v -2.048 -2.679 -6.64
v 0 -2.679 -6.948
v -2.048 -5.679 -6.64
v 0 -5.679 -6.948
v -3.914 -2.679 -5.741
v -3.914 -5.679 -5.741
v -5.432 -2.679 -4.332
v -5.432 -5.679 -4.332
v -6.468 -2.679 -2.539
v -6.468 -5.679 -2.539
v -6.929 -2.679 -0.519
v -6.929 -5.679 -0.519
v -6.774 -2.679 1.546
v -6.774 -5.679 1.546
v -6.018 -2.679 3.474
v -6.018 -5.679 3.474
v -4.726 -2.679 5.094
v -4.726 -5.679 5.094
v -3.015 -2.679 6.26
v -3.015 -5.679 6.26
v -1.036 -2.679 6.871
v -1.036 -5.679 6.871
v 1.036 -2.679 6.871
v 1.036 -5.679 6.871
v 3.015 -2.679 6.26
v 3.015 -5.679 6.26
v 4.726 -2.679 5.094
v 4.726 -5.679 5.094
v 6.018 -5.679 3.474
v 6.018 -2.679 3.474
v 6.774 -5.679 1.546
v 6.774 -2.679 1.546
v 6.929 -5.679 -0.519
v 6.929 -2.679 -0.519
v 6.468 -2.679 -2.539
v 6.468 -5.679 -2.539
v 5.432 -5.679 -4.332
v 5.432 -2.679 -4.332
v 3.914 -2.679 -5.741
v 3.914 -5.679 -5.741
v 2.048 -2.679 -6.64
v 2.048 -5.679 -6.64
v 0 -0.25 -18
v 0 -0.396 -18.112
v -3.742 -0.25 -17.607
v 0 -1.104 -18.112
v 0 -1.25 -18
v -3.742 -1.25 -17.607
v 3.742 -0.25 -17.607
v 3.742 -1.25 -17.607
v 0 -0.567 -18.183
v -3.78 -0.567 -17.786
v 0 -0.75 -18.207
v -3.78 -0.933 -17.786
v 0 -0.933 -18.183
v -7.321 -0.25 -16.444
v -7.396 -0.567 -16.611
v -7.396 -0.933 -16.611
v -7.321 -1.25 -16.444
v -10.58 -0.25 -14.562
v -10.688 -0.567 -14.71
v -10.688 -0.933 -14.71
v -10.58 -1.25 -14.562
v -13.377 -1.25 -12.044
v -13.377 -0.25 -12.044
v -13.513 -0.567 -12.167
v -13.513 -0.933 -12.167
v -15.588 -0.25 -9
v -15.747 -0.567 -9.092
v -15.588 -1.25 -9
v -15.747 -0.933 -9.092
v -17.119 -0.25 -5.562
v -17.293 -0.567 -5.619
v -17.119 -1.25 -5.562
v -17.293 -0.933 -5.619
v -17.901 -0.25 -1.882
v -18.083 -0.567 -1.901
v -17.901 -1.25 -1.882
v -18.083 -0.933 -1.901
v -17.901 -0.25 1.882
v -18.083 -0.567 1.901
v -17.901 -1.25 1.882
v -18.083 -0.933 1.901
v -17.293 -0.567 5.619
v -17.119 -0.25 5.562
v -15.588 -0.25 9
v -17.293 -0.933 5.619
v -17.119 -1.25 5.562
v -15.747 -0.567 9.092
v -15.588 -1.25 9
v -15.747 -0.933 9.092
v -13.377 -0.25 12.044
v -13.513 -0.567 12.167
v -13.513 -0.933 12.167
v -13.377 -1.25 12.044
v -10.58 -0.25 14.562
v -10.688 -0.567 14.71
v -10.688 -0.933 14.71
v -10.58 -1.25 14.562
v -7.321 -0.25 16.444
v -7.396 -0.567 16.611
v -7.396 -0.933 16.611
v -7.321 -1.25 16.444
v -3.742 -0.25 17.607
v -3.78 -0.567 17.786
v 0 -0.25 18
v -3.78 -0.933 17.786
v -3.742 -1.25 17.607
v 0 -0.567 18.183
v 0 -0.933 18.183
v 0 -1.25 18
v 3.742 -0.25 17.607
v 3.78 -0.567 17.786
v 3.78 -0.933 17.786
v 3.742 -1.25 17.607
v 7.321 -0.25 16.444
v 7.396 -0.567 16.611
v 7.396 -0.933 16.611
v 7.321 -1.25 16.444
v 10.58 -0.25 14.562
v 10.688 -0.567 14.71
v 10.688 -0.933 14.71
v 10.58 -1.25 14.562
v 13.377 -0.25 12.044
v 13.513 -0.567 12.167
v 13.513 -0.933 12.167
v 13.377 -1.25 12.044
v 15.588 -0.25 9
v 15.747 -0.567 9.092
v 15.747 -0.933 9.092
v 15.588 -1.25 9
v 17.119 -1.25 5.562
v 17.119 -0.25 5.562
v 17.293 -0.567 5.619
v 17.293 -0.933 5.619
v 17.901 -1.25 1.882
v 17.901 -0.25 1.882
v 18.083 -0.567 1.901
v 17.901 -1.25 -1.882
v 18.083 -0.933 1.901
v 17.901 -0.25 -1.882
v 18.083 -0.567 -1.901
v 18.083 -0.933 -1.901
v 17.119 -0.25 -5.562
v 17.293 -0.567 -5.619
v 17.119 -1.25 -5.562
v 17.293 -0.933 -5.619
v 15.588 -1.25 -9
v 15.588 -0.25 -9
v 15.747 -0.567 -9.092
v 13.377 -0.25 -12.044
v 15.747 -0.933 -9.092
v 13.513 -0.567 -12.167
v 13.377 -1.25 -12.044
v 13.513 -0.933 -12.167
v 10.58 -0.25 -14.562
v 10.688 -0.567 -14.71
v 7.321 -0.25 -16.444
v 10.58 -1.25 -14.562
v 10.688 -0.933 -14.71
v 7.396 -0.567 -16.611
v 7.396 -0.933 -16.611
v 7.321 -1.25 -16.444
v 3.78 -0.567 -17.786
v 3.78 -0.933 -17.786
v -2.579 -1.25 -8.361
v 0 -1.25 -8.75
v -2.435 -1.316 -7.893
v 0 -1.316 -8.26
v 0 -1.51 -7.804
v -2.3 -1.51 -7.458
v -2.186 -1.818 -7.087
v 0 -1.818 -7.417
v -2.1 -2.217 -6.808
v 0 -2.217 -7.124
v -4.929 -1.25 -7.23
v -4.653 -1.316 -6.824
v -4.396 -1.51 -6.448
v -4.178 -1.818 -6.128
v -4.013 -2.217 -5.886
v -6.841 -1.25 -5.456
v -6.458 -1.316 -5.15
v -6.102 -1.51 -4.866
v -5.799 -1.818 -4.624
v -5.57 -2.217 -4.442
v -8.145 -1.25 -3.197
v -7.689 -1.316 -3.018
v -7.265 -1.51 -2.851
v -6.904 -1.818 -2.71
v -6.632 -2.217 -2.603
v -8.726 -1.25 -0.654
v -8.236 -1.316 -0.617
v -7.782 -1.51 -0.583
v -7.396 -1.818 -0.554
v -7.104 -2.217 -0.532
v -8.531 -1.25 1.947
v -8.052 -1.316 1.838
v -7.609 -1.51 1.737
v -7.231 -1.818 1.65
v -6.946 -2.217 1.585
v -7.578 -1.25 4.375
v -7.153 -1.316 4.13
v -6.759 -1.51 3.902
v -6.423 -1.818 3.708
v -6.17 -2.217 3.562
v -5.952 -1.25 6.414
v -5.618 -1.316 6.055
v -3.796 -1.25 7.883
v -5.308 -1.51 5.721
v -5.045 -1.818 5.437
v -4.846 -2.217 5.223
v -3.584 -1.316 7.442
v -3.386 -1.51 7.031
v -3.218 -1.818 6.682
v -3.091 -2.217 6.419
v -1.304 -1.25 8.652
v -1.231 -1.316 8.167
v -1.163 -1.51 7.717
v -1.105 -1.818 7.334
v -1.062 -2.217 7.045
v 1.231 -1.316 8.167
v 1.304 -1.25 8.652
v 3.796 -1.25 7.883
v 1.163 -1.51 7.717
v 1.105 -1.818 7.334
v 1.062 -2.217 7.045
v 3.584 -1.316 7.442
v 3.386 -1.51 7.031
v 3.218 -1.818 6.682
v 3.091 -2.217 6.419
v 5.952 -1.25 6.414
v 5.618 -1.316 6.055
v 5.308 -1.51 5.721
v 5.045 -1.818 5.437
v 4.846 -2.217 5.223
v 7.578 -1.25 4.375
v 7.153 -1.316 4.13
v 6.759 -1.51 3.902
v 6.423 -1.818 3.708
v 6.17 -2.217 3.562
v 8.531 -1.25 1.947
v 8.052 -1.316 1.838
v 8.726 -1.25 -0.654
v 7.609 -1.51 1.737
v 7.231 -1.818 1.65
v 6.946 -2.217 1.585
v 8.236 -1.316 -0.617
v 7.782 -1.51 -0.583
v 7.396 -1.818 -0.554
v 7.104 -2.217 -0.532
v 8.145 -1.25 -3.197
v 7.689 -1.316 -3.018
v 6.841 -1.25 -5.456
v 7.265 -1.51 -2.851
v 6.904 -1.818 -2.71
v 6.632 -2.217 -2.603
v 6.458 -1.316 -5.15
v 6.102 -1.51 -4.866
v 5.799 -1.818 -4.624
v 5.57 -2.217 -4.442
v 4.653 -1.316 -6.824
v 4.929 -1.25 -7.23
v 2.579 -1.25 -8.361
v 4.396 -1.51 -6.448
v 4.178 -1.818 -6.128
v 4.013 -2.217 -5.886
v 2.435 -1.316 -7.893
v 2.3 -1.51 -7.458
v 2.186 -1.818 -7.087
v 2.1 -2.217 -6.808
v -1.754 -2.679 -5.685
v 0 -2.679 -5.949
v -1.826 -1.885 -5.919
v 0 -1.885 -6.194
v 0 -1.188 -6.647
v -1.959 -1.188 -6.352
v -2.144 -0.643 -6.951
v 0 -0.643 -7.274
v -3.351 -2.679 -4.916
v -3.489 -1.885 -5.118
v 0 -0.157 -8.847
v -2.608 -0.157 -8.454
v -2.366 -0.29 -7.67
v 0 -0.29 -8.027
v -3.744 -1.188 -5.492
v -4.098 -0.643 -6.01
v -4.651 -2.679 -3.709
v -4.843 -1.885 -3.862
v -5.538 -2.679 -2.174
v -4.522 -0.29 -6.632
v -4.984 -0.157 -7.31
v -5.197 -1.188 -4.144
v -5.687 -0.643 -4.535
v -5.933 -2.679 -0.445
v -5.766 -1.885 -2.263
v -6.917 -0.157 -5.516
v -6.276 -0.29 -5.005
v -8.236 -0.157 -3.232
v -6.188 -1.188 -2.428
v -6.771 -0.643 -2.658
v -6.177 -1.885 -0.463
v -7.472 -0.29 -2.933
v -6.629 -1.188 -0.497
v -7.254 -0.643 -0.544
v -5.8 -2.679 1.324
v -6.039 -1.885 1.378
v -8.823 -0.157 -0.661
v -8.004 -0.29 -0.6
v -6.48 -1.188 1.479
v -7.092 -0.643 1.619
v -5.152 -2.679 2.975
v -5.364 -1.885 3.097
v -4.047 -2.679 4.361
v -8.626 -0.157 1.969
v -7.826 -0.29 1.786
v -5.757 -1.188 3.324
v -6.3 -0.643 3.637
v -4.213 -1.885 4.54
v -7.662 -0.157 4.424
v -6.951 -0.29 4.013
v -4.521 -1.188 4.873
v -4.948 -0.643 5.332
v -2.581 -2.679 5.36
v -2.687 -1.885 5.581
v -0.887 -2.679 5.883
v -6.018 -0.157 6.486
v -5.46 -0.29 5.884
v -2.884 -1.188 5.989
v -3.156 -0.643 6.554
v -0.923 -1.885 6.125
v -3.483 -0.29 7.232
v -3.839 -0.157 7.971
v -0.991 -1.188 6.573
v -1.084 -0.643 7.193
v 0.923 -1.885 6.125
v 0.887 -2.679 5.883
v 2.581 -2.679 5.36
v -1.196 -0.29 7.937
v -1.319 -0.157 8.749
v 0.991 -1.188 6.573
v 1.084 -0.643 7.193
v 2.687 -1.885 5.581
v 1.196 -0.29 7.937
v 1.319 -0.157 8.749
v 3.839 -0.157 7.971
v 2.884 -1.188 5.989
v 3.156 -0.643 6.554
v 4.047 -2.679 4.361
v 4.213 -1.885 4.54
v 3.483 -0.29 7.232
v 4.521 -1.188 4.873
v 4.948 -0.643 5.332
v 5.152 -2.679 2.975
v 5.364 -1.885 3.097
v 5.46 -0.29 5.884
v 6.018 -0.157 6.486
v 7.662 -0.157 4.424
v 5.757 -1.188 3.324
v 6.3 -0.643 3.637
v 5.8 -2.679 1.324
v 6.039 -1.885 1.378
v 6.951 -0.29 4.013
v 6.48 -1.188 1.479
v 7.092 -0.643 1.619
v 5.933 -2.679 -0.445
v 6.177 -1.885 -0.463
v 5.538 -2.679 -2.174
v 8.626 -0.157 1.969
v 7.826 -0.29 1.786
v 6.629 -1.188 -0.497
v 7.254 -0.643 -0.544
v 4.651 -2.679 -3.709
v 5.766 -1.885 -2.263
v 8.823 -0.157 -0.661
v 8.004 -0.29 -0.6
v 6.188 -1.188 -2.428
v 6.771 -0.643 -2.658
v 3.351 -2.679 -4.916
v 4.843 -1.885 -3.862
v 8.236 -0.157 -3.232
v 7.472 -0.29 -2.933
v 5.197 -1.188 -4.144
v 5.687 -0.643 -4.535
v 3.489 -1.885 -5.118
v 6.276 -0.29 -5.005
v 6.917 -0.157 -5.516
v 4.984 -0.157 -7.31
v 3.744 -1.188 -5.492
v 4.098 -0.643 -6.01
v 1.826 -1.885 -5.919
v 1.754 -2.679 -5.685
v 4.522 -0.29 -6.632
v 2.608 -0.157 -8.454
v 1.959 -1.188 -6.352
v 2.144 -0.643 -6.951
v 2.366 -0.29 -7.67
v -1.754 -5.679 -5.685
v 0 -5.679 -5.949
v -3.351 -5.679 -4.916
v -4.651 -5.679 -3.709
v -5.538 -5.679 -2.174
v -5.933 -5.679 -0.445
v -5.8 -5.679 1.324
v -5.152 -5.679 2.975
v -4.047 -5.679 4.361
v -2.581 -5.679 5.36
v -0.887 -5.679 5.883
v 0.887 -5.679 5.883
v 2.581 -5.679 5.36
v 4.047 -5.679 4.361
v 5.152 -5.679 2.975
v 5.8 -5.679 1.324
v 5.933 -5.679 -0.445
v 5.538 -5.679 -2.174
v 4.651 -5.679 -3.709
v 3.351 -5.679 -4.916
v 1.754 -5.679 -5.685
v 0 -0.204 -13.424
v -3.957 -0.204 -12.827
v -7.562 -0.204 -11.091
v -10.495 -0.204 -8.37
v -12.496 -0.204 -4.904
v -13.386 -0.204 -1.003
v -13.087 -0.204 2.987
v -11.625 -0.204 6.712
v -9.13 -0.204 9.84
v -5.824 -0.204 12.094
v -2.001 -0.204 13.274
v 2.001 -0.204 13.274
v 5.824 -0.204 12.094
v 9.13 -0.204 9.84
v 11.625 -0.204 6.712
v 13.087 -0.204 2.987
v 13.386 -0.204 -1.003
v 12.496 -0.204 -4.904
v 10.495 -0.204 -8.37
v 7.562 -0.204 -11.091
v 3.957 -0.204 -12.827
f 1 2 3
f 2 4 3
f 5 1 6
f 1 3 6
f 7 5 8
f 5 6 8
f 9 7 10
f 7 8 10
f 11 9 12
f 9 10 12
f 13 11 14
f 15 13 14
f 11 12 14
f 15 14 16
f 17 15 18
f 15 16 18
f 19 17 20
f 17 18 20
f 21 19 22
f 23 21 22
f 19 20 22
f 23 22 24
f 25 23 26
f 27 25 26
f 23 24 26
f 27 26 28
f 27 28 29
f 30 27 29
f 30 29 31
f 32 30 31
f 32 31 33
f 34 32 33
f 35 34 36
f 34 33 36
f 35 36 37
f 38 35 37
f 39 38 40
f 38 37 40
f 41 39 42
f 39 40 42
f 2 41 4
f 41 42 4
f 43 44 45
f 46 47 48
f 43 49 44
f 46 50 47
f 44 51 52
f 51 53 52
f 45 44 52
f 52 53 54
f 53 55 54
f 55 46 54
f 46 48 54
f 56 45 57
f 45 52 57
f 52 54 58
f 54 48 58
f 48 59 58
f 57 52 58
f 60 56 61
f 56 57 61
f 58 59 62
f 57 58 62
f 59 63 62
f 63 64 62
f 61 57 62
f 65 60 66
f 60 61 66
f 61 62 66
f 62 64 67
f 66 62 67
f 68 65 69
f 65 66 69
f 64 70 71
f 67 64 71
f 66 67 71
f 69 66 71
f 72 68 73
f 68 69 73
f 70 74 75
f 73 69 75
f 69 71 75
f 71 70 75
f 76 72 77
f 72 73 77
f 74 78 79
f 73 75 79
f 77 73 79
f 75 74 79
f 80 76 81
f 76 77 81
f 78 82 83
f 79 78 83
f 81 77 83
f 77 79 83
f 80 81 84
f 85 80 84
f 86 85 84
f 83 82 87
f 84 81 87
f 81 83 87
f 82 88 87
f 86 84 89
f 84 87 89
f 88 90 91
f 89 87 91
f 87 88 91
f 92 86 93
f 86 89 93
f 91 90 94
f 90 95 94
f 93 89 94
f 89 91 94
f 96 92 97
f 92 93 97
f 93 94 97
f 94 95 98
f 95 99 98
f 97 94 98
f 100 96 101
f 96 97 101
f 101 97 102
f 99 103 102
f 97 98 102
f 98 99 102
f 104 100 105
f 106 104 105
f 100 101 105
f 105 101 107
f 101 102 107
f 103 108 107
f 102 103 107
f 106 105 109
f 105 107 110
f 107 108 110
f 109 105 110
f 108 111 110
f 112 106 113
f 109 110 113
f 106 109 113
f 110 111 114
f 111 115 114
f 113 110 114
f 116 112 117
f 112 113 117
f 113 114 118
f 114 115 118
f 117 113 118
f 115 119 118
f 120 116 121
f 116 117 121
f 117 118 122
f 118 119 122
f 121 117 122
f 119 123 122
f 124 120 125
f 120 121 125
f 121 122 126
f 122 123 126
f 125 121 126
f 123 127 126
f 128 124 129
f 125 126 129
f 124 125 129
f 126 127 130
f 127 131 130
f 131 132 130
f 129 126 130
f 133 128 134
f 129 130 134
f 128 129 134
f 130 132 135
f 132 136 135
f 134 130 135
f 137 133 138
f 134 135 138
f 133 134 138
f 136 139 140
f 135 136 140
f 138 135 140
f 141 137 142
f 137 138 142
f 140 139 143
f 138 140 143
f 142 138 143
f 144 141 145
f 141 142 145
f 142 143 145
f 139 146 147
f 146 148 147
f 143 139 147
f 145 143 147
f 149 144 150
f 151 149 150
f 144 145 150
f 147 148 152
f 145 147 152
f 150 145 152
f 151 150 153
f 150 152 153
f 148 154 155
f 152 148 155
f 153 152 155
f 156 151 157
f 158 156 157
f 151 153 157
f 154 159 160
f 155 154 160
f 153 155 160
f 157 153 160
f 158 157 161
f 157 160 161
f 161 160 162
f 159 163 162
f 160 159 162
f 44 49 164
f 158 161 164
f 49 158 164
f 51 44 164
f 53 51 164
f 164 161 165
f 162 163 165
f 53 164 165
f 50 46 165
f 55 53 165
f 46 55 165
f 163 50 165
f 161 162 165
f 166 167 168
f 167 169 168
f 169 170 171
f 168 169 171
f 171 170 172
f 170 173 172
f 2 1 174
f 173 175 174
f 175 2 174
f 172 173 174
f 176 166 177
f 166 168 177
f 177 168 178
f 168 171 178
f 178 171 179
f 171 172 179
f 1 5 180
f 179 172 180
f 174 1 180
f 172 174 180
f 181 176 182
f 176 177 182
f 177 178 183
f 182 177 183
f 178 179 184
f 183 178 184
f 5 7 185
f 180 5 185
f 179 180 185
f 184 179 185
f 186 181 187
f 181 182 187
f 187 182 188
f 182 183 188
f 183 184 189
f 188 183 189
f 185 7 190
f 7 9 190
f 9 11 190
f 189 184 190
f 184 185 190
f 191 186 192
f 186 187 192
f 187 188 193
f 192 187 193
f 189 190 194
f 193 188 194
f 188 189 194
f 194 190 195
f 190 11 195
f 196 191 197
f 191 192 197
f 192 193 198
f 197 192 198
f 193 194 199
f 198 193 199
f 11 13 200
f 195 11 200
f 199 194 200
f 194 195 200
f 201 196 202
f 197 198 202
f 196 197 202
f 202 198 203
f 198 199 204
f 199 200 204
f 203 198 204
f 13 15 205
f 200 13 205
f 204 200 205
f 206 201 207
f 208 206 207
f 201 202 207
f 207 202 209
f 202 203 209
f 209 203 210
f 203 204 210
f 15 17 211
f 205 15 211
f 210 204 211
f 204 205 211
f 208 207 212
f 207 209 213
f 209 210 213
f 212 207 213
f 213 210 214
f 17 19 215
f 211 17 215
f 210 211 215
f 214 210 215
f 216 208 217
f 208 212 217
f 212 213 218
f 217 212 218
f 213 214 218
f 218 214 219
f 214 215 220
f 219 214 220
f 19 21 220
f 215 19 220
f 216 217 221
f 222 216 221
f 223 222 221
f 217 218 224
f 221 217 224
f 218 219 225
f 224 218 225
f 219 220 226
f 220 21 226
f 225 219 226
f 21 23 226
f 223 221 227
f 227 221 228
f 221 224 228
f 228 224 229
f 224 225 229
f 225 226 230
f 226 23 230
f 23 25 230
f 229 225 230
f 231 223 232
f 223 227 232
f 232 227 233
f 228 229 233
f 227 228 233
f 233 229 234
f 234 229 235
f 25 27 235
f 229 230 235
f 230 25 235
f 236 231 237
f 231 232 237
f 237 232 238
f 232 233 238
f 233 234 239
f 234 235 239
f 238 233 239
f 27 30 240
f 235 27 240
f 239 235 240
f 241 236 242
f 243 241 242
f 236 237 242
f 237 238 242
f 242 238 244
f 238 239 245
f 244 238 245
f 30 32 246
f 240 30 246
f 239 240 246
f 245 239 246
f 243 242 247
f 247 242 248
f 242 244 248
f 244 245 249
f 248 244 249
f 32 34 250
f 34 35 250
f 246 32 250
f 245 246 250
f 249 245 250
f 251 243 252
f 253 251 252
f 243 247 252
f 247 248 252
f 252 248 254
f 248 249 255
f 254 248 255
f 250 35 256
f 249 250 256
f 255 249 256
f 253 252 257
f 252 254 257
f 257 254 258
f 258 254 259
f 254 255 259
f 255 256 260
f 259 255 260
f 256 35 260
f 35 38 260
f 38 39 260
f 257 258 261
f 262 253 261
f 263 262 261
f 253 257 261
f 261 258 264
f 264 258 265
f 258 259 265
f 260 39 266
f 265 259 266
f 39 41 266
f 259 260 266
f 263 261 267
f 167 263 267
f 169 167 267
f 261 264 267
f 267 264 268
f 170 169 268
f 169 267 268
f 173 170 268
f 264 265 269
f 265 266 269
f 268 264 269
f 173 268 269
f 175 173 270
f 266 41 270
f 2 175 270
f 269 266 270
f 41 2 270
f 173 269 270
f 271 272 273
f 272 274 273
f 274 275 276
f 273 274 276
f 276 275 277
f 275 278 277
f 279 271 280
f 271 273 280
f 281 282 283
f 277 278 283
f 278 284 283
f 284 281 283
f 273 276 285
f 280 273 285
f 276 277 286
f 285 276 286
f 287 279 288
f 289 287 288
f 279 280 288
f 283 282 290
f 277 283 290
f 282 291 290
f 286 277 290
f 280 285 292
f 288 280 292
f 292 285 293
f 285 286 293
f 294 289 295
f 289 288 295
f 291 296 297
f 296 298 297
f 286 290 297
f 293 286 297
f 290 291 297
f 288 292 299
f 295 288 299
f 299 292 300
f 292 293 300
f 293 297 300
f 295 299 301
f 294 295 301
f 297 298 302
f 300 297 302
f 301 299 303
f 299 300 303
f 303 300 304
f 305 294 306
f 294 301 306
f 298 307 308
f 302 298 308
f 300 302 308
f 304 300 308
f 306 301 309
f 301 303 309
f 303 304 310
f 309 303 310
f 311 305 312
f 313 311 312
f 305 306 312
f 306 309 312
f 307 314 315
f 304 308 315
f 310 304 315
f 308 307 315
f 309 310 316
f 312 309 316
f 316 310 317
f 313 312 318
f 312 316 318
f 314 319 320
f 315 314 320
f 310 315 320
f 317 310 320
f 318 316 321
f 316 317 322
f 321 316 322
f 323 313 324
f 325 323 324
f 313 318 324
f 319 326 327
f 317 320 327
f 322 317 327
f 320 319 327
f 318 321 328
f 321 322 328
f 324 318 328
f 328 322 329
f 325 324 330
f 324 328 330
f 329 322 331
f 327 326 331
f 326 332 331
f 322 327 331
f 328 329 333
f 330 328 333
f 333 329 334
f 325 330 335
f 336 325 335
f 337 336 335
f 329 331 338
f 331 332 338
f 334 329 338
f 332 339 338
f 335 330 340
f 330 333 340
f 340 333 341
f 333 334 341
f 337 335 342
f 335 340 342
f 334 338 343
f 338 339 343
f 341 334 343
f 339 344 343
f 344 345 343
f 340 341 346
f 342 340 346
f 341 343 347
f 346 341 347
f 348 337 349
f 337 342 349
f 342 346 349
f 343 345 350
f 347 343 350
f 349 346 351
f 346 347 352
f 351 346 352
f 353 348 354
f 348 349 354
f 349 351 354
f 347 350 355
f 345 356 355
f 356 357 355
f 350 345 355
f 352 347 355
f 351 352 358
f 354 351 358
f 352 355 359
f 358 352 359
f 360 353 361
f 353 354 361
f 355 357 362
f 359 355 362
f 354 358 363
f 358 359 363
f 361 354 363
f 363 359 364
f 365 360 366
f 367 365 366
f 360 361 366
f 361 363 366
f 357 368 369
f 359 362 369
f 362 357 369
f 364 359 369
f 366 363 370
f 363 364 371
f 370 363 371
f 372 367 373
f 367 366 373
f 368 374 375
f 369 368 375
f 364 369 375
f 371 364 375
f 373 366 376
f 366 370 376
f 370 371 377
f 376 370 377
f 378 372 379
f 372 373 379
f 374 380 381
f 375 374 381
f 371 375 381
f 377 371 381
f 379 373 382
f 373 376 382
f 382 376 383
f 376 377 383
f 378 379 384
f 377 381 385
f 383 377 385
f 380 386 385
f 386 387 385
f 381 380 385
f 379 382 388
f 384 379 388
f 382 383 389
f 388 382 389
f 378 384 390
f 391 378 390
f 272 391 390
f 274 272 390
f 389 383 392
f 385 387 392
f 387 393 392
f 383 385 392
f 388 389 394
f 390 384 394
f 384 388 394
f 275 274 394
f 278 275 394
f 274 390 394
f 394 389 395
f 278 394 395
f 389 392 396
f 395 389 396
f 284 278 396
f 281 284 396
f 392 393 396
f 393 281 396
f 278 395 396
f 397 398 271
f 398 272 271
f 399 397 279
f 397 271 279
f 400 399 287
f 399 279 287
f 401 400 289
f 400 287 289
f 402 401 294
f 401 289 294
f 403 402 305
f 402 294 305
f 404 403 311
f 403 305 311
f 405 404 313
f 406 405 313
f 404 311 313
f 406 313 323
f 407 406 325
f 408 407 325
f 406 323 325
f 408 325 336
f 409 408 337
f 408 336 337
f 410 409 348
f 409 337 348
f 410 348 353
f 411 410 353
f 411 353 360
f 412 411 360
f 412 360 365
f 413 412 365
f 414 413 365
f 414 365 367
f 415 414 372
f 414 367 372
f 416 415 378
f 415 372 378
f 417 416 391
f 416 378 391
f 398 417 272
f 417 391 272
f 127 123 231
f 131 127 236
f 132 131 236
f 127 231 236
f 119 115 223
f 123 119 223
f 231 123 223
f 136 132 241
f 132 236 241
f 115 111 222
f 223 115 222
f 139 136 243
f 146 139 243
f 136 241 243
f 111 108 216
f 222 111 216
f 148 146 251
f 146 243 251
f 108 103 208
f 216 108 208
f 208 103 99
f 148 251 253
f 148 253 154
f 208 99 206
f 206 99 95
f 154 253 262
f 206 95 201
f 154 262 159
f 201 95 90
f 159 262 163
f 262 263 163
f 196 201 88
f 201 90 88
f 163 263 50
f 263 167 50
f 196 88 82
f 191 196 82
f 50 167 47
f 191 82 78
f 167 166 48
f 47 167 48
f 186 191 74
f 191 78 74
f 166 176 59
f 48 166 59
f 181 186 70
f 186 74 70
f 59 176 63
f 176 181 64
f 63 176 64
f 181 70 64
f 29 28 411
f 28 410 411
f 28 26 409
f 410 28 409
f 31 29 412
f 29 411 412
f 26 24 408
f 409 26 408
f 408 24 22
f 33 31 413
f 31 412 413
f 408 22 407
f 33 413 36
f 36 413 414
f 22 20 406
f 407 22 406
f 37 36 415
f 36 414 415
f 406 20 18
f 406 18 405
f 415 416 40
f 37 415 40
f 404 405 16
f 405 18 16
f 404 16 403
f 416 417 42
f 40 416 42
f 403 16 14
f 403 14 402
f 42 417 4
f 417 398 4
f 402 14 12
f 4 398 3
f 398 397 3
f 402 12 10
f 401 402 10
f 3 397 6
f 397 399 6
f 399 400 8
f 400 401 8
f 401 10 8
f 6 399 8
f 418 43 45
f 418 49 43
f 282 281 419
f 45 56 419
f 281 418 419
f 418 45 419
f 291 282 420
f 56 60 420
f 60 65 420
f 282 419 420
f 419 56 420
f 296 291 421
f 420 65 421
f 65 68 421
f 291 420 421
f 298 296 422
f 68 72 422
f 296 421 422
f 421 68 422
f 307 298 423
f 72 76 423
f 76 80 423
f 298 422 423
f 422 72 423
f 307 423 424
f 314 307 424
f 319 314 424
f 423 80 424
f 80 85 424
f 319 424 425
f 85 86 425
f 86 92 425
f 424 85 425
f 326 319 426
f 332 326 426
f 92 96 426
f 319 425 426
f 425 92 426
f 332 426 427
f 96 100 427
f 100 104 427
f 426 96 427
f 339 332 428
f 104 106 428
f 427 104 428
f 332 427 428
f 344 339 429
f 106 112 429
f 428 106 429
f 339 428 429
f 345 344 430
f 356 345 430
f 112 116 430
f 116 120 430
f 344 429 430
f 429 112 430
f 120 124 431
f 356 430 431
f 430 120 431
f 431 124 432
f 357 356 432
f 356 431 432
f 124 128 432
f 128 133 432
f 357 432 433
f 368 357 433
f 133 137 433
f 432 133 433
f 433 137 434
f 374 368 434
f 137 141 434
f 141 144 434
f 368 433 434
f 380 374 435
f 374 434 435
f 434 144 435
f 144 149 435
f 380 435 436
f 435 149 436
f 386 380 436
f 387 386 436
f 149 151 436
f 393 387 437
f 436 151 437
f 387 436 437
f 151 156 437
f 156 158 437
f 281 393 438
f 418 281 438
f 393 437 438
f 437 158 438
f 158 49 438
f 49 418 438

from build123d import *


with BuildPart() as part:
    # Sketch1 → Revolve1 (revolve)
    with BuildSketch(Plane(origin=(0, 0, 0), x_dir=(0, 0, -1), z_dir=(1, 0, 0)), mode=Mode.PRIVATE) as revolve1_sk:
        with BuildLine():
            Line((-18, -1.25), (-8.75, -1.25))
            ThreePointArc((-8.75, -1.25), (-7.600097578, -1.650784896), (-6.94842599, -2.679487115))
            Line((-6.94842599, -2.679487115), (-6.94842599, -5.679487115))
            Line((-6.94842599, -5.679487115), (-5.949317187, -5.679487115))
            Line((-5.949317187, -5.679487115), (-5.949317187, -2.679487115))
            ThreePointArc((-5.949317187, -2.679487115), (-6.941628239, -0.893587174), (-8.847382379, -0.157230615))
            Line((-8.847382379, -0.157230615), (-18, -0.25))
            ThreePointArc((-18, -0.25), (-18.207106781, -0.75), (-18, -1.25))
        make_face()
    revolve(revolve1_sk.sketch.rotate(Axis((0, -237.677688504, 0), (0, 1, 0)), 180), axis=Axis((0, -237.677688504, 0), (0, 1, 0)))


solid = part.part
